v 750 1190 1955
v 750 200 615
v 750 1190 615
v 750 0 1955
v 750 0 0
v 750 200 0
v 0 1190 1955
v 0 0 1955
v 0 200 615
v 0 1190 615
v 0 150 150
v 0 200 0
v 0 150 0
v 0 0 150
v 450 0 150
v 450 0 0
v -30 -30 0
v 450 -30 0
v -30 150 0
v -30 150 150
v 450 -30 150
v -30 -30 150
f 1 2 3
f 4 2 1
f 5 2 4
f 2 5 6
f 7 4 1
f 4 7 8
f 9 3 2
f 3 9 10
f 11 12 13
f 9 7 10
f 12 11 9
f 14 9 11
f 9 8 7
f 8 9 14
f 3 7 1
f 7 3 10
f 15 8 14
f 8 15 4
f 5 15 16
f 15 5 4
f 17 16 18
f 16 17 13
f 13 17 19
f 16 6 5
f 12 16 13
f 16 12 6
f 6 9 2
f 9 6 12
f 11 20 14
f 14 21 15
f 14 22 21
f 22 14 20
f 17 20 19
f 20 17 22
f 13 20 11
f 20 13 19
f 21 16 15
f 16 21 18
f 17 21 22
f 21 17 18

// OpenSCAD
dim_depth = 1190;
dim_width = 750;
dim_height_top = 1340;
dim_height_base = 615;
dim_depth_base = 200;

dim_tile_height = 150;
dim_tile_width = 30;



module hebel(){
	color("white"){
		translate([0,0,dim_height_base])cube([dim_width, dim_depth, dim_height_top]);
		cube([dim_width,dim_depth_base,dim_height_base]);
	}
}

hebel();

corner();

module corner(){
	translate([-dim_tile_width,0,0])cube([dim_tile_width, 150, dim_tile_height]);
	translate([ -30, -30, 0])cube([450 + dim_tile_width, 30, dim_tile_height]);
}
